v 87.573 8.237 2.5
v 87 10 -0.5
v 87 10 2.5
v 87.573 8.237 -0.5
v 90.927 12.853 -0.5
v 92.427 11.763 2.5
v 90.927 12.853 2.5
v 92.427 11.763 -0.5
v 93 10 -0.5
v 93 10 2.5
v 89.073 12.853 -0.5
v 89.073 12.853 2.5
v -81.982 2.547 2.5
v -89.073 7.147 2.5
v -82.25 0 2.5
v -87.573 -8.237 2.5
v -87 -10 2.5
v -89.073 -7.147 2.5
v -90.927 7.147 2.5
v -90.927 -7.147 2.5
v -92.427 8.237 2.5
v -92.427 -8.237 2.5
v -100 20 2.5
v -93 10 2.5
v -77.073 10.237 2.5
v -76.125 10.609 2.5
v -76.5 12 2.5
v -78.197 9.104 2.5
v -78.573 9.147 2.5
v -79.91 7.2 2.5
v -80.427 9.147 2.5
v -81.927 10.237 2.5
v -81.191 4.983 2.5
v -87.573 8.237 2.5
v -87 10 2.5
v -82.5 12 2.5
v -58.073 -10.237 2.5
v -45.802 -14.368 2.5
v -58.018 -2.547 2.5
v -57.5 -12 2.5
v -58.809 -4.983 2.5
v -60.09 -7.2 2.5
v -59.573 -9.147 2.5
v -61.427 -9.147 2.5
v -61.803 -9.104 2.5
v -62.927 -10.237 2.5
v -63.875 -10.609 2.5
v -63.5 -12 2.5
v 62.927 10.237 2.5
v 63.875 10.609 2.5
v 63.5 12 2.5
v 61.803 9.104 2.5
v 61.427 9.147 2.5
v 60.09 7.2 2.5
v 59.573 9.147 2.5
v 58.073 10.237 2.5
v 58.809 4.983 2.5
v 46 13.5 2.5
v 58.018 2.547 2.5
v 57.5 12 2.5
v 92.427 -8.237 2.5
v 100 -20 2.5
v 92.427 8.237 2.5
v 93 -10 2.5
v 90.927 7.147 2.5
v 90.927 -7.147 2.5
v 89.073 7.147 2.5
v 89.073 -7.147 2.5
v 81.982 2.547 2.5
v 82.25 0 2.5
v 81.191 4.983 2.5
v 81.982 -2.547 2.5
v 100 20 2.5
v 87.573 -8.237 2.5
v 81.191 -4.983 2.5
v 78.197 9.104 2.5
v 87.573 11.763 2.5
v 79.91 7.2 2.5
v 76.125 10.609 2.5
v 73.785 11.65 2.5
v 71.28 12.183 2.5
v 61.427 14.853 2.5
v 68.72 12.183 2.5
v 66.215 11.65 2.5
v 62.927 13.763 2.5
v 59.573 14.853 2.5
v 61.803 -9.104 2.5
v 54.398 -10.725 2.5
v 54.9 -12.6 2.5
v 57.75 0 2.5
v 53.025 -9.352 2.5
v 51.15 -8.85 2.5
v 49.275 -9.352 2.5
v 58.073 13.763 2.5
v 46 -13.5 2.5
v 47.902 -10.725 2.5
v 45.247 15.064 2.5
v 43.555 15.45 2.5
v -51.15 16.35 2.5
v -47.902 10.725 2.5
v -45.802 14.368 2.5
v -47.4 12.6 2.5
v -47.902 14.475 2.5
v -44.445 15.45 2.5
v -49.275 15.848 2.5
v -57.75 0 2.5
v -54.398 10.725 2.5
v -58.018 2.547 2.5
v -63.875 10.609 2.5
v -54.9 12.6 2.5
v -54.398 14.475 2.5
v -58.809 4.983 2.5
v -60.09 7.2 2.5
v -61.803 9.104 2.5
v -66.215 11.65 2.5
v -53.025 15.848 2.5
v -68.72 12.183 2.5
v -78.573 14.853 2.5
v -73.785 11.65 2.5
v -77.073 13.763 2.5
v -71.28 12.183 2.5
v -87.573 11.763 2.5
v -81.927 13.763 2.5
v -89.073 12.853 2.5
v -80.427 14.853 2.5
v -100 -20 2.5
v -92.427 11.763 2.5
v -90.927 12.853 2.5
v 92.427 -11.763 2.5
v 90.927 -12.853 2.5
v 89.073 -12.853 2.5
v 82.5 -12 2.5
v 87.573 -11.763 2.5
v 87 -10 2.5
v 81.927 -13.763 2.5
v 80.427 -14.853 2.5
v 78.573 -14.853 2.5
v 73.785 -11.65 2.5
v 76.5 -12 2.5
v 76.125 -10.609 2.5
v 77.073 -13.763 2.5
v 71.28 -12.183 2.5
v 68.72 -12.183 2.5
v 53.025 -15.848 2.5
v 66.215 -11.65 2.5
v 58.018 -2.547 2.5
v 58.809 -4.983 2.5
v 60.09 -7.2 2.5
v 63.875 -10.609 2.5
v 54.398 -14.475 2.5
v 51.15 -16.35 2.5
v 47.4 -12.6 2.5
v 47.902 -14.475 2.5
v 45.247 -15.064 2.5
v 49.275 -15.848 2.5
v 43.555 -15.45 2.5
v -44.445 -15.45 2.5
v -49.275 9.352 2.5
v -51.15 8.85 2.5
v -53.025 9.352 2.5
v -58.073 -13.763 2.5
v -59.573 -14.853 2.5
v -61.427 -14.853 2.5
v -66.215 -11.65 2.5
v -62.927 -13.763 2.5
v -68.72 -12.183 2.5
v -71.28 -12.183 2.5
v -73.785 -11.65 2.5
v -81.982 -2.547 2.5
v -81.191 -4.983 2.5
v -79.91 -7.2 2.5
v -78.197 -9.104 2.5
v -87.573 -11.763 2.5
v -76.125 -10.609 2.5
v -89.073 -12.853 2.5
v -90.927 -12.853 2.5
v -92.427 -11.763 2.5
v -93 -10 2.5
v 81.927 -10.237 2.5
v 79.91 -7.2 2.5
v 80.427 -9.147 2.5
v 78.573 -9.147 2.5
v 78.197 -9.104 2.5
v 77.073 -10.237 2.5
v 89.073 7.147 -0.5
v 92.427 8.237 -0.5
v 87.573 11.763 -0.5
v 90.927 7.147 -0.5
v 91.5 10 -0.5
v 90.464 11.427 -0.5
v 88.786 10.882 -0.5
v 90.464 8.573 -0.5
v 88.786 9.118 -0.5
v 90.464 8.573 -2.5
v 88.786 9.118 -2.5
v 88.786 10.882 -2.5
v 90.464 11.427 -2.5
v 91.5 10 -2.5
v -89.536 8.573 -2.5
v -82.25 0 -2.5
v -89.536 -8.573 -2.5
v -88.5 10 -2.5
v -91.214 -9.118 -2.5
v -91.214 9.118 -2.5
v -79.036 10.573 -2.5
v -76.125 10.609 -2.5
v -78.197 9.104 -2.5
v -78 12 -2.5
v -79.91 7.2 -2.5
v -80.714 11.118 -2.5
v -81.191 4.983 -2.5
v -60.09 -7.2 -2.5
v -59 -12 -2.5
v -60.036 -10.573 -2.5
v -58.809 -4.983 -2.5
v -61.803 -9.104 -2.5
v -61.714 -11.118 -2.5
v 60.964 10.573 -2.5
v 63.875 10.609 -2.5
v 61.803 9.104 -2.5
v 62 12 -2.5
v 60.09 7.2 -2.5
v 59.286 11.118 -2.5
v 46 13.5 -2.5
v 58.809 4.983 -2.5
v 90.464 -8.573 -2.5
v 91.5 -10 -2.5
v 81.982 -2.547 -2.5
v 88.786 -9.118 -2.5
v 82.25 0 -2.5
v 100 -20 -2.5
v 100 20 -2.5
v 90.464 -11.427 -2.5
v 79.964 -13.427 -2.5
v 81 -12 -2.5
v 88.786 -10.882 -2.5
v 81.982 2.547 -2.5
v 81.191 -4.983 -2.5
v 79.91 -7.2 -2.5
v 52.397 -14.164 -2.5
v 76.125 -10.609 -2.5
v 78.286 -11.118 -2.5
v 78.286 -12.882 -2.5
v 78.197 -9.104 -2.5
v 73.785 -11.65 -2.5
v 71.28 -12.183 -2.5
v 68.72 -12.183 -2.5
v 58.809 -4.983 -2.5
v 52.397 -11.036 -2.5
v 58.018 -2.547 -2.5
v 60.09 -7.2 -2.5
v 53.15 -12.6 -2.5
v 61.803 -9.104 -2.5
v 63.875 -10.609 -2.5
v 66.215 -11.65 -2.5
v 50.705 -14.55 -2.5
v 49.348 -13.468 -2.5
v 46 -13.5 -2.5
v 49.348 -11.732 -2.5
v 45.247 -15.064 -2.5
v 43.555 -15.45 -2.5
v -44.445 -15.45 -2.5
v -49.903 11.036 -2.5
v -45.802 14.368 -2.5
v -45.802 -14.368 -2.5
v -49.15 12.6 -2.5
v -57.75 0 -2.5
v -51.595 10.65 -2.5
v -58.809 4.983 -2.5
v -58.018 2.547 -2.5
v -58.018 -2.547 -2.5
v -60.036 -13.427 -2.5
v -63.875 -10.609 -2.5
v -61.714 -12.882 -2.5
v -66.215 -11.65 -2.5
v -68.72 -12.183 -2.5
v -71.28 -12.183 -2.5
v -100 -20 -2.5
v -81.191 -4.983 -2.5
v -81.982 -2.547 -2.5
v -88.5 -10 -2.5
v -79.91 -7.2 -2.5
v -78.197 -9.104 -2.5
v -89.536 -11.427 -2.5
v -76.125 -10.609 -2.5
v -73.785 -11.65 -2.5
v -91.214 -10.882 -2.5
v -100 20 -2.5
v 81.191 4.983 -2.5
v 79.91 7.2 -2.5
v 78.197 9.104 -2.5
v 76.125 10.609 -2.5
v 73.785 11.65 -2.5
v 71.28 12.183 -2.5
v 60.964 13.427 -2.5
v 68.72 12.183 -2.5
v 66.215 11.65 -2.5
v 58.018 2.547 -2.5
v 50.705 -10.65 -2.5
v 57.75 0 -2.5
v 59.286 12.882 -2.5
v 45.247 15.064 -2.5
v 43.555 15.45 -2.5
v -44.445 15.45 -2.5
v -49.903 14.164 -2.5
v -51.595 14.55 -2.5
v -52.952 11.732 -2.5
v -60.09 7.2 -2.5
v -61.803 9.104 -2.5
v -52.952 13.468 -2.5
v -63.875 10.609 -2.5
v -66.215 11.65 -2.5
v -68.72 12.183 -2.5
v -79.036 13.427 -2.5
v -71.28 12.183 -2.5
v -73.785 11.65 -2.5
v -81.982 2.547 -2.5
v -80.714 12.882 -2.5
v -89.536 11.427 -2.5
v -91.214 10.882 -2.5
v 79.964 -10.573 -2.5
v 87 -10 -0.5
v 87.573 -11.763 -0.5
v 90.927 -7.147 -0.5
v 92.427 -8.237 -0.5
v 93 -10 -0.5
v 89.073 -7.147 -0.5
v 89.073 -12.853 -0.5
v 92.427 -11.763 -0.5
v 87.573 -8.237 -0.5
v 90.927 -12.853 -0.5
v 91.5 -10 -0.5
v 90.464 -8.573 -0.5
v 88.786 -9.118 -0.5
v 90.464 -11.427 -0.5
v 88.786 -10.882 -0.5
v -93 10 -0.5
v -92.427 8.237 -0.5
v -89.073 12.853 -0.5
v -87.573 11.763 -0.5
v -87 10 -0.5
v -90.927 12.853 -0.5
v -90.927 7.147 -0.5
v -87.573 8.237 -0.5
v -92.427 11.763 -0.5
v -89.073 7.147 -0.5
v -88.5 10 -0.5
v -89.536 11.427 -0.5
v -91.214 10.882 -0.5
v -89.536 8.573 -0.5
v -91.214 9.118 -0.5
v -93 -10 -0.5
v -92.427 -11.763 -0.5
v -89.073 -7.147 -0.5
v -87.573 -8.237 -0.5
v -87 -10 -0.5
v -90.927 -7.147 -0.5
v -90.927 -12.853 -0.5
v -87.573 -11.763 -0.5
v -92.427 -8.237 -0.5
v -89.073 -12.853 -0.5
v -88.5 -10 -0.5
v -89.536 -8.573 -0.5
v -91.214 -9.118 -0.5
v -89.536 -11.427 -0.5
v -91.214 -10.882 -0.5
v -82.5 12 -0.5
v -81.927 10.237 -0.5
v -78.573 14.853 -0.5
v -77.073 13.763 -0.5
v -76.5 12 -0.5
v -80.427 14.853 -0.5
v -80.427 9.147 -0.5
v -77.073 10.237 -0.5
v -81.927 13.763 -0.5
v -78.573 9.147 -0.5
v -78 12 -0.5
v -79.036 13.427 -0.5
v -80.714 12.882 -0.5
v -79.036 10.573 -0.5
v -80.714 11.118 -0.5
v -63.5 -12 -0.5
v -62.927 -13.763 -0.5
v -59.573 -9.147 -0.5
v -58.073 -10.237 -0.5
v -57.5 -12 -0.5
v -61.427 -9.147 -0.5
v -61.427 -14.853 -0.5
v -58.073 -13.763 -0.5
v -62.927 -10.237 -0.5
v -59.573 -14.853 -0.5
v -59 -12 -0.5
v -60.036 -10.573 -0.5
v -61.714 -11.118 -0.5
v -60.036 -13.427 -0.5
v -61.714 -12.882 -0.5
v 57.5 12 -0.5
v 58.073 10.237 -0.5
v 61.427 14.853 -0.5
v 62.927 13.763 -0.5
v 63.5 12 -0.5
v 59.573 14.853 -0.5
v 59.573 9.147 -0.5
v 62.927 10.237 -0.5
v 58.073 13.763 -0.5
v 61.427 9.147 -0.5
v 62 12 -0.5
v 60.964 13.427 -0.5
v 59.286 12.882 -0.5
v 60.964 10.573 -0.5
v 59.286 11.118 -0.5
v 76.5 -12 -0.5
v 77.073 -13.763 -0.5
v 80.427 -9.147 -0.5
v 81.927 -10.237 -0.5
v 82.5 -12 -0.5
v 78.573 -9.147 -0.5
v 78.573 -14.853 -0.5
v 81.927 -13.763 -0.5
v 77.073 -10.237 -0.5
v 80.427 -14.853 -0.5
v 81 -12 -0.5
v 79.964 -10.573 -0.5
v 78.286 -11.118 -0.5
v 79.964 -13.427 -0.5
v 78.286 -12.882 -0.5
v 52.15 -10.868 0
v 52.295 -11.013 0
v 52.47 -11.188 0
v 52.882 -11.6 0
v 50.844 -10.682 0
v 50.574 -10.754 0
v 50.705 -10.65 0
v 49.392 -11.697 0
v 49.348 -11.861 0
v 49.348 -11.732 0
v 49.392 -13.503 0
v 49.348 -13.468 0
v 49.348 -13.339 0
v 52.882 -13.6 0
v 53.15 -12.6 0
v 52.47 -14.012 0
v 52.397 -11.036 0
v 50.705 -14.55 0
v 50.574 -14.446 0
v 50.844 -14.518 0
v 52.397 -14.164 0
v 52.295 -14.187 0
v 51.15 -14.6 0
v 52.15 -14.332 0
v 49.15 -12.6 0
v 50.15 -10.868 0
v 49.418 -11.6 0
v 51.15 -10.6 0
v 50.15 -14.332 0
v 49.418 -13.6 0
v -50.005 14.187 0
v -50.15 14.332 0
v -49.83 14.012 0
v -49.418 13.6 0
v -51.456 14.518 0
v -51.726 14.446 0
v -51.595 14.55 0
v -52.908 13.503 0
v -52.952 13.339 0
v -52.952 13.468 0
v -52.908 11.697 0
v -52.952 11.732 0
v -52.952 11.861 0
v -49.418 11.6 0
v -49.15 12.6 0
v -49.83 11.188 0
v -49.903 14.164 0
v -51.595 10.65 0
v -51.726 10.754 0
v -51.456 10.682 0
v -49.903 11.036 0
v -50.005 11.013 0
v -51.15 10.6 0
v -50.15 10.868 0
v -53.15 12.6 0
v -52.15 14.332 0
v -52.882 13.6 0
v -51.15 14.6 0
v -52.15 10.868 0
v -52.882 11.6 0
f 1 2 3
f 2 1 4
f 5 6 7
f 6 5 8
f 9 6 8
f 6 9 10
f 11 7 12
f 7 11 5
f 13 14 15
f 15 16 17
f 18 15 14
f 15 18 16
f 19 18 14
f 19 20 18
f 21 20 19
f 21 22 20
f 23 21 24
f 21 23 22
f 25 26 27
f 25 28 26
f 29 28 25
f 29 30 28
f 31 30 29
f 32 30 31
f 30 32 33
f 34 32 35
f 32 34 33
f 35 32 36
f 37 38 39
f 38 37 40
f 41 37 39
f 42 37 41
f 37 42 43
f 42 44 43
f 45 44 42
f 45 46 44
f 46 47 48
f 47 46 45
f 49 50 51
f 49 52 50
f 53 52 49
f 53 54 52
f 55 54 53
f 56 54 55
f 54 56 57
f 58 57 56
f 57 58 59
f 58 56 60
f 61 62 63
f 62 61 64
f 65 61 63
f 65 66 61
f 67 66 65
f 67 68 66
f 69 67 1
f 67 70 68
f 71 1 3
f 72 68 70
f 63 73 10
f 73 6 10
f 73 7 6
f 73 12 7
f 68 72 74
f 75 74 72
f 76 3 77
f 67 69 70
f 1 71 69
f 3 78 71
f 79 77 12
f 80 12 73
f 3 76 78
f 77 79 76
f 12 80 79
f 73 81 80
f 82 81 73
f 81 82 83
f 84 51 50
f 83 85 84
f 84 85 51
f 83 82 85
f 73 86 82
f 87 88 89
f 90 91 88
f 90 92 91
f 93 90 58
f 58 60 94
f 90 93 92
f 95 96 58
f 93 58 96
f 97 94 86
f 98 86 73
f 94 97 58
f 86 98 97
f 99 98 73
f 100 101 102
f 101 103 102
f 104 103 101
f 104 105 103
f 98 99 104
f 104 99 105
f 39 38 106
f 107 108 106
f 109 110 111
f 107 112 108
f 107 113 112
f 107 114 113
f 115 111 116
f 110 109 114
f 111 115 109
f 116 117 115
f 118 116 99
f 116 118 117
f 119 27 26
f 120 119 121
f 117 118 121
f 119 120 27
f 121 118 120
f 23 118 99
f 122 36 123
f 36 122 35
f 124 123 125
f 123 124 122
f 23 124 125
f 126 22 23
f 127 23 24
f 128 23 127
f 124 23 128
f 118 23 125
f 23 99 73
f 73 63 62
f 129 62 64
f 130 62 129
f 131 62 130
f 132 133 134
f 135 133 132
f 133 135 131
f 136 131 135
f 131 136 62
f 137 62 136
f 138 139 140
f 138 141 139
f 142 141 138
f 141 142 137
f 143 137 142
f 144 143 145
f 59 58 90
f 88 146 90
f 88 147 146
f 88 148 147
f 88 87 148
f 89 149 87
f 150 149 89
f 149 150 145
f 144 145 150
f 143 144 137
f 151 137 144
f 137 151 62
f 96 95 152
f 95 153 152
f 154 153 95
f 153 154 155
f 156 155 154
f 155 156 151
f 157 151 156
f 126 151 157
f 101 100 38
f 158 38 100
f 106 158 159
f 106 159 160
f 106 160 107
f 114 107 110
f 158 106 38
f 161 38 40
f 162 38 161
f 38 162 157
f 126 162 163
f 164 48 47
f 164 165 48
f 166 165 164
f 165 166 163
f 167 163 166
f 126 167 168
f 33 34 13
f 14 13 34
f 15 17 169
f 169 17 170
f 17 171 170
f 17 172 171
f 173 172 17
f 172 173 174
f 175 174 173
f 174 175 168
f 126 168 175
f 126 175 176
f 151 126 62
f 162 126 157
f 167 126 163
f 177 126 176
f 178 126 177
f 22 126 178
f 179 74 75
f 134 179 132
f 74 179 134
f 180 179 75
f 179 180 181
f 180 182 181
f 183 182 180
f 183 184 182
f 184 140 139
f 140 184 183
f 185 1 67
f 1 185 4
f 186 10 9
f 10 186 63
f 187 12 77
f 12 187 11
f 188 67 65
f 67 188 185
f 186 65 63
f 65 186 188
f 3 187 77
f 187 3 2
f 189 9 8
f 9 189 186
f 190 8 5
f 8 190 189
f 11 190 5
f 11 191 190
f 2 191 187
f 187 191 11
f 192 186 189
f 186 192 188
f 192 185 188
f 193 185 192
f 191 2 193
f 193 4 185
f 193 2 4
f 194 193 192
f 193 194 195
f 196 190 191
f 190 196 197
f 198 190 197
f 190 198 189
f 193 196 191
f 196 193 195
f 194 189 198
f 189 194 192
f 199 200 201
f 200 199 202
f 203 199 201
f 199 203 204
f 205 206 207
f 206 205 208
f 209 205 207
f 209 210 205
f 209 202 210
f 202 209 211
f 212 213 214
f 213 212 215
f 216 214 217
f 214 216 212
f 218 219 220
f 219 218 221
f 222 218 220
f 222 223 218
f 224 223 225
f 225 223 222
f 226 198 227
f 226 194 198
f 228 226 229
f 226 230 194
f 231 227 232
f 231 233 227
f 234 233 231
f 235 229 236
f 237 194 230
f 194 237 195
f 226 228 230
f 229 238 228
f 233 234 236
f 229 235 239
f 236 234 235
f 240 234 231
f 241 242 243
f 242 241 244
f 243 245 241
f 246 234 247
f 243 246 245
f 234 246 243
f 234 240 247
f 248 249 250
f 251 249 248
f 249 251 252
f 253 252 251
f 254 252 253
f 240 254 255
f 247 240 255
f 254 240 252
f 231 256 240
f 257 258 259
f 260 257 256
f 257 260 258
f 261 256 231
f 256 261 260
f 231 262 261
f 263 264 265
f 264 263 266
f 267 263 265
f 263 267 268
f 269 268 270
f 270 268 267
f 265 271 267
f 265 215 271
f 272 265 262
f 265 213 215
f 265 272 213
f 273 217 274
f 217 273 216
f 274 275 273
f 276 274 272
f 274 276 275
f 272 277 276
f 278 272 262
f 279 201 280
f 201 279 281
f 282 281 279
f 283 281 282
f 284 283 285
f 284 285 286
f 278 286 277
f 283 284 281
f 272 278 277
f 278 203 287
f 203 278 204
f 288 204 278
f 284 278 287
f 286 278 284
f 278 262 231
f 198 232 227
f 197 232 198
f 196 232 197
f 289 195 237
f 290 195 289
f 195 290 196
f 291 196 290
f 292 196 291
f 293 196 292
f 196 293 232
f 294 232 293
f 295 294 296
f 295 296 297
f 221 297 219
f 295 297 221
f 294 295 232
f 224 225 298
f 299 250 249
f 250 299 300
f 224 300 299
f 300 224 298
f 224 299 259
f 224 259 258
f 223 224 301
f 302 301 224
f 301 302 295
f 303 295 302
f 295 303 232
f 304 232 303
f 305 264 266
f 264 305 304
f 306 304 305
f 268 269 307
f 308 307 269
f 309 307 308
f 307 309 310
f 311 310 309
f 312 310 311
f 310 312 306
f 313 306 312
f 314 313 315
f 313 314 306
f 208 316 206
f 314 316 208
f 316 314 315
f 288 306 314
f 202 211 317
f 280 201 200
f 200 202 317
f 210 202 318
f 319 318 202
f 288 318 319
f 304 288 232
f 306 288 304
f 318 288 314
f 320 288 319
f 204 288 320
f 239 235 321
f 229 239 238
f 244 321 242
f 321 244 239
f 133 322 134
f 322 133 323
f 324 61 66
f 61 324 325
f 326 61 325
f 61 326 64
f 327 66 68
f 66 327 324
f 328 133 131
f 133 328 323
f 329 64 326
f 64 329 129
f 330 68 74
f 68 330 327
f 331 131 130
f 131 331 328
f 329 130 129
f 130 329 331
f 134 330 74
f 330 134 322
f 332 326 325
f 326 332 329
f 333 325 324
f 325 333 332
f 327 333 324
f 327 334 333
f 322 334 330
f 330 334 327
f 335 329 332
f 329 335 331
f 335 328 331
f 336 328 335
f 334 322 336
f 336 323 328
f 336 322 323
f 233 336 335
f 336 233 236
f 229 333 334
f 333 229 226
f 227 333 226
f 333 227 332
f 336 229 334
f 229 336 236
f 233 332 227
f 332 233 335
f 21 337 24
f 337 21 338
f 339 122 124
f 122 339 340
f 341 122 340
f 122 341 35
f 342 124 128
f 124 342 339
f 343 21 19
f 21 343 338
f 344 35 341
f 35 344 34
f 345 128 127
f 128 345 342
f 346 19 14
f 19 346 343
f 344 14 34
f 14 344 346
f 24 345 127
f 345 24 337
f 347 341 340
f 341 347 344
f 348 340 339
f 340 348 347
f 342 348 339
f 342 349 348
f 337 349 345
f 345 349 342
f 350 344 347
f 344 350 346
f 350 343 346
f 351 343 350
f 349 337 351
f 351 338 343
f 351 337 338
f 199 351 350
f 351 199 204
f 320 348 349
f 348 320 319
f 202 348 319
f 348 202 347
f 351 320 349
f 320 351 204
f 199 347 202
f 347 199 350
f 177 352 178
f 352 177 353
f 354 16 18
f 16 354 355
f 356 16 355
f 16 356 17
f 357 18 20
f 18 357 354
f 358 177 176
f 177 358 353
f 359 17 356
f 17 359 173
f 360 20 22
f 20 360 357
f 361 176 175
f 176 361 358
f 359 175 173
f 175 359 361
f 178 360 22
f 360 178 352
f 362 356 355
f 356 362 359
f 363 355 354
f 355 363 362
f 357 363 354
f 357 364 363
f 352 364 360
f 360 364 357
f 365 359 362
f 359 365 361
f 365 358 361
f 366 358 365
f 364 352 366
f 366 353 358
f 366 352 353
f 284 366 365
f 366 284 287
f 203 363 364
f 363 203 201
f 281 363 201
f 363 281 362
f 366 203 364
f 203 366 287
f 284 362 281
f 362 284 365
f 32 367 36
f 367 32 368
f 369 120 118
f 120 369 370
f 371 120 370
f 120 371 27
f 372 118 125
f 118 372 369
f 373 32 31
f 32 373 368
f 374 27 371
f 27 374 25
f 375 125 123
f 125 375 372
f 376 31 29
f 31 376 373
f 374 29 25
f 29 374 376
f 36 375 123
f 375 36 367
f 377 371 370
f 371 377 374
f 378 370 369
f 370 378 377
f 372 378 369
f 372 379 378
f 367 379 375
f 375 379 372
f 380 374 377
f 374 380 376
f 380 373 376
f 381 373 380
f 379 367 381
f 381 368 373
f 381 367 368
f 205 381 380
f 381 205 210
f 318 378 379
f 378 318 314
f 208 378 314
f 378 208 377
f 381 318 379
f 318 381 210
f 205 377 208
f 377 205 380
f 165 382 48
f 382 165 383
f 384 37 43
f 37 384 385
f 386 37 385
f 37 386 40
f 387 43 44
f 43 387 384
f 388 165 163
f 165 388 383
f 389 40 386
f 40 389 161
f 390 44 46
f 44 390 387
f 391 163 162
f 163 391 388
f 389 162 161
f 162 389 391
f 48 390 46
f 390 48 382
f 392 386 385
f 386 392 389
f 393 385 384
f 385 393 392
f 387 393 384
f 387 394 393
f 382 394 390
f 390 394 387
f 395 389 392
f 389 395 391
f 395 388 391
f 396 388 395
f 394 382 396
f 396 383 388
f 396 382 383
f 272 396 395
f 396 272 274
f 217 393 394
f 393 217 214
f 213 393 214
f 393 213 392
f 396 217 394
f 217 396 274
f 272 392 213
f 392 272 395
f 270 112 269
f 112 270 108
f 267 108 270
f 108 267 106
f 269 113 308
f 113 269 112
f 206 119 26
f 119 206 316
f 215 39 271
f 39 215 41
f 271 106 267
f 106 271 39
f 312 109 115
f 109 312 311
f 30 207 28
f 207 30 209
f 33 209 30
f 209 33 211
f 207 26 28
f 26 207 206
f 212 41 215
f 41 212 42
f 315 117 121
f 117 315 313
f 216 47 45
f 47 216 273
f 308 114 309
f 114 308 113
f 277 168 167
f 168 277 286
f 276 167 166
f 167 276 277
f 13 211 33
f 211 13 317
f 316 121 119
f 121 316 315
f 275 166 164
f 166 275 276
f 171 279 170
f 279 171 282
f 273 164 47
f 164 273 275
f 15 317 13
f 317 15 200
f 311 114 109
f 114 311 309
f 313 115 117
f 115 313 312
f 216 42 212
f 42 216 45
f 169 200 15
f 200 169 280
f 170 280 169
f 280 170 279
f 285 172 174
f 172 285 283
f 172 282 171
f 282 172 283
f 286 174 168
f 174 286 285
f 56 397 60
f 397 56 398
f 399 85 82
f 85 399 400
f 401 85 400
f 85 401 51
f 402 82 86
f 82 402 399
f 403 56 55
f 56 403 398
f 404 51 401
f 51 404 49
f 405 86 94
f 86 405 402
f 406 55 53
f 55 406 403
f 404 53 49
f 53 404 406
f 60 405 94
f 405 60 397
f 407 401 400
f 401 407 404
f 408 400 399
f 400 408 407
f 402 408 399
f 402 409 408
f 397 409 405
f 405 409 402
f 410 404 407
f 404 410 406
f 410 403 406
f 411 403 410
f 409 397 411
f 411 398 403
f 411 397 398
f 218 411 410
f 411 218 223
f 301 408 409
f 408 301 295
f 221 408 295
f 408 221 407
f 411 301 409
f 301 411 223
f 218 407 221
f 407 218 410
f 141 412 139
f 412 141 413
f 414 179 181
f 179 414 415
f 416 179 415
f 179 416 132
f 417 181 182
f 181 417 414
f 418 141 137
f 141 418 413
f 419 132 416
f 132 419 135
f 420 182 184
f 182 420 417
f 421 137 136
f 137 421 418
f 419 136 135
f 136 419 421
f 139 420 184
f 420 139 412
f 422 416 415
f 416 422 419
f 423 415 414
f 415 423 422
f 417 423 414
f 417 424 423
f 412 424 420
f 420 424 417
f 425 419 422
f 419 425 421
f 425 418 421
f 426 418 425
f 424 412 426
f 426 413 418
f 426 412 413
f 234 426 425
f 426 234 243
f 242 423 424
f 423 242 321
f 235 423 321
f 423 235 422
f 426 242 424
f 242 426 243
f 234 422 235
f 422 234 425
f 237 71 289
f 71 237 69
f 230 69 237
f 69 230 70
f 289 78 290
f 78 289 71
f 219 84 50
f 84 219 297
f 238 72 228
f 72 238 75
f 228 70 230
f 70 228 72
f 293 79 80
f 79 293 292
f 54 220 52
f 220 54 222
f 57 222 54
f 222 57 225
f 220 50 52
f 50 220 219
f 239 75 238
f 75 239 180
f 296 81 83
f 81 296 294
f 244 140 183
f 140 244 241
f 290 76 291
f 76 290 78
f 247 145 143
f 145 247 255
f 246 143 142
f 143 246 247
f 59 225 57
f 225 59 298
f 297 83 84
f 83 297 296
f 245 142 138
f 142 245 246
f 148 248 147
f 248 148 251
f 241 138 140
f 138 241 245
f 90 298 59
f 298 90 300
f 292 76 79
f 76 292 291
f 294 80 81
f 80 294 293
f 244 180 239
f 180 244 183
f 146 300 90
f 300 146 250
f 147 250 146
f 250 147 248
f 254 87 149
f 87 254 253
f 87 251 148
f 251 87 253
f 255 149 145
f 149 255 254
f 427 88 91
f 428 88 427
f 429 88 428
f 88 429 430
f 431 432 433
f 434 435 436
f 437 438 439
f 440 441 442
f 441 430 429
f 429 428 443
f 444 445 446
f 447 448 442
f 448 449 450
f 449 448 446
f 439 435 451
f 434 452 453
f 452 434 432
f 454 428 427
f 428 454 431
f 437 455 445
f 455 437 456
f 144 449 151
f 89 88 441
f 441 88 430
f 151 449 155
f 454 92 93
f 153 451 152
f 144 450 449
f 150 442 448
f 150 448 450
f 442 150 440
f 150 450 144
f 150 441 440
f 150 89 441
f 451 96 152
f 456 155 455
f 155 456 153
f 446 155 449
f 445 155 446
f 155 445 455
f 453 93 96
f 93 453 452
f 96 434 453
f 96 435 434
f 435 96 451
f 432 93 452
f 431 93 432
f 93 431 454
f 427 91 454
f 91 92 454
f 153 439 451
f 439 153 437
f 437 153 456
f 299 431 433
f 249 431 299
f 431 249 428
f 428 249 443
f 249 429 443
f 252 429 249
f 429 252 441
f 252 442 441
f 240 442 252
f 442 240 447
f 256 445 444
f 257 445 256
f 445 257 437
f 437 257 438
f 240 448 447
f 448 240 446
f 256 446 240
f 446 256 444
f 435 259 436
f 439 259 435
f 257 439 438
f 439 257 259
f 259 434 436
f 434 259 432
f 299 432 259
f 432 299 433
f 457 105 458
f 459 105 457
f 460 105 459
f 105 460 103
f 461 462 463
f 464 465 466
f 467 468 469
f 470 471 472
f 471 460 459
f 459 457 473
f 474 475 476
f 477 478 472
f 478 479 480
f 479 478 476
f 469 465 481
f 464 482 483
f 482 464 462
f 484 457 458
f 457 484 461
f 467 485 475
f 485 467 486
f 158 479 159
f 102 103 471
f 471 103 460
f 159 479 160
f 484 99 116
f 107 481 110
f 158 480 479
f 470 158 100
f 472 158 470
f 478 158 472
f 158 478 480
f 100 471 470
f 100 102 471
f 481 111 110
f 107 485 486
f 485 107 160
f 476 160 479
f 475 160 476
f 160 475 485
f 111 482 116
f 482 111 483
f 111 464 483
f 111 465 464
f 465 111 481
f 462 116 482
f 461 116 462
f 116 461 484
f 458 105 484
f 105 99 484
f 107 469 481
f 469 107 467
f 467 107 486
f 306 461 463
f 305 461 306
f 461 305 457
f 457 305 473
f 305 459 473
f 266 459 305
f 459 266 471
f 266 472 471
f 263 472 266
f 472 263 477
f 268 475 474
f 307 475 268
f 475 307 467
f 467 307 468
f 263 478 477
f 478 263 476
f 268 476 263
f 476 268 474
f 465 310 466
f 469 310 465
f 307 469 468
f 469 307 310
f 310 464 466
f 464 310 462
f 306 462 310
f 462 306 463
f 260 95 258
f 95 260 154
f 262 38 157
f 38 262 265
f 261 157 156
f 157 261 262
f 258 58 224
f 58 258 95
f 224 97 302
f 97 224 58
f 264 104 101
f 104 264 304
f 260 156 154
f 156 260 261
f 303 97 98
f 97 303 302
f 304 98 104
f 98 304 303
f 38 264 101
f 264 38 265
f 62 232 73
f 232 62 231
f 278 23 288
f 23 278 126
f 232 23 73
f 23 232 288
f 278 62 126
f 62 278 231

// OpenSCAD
difference($fn=100) {
  length = 200;
  length1 = length / 2;

  width = 40;
  width1 = width / 2;

  height = 5;
  height1 = height / 2;

  cube([length, width, height], true);

  // Nut heads
  x = length1 - 10;
  y = width1 - 10;
  z = 0;

  translate([x, y, z])
    m3_head_insert();
  translate([x, -y, z])
    m3_head_insert();
  translate([-x, y, z])
    m3_head_insert();
  translate([-x, -y, z])
    m3_head_insert();
  
  // Socket mounts
  translate([-70, 0, 0])
    socket_mount();
  translate([70, 0, 0])
    socket_mount();
  
  // Temple audio module mount  
  temple_audio_module_mount();
}

module m3_head_insert() {
  union() {
    translate([0, 0, 1])
      cylinder(d = 6, h = 3, center = true);
    translate([0, 0, -1.5])
      cylinder(d = 3, h = 2, center = true);
  }
}

module m4_head_insert() {
  union() {
    translate([0, 0, 1.25])
      cylinder(d1 = 4, d2 = 7.5, h = 2.5, center = true);
    translate([0, 0, -1.25])
      cylinder(d = 4, h = 2.5, center = true);
  }
}

module socket_mount() {
  union() {
    cylinder(d = 24.5, h = 5, center = true);
    translate([-9.5, 12, 0])
      m3_head_insert();
    translate([9.5, -12, 0])
      m3_head_insert();
  }
}

module temple_audio_module_mount() {
  union() {
    minkowski() {
      cube([92 - 4, 31 - 4, 5 - 1], true);
      cylinder(d = 4, h = 1, center = true);
    }
    translate([51.15, -12.60, 0])
      m4_head_insert();
    translate([-51.15, 12.60, 0])
      m4_head_insert();
  }
}
